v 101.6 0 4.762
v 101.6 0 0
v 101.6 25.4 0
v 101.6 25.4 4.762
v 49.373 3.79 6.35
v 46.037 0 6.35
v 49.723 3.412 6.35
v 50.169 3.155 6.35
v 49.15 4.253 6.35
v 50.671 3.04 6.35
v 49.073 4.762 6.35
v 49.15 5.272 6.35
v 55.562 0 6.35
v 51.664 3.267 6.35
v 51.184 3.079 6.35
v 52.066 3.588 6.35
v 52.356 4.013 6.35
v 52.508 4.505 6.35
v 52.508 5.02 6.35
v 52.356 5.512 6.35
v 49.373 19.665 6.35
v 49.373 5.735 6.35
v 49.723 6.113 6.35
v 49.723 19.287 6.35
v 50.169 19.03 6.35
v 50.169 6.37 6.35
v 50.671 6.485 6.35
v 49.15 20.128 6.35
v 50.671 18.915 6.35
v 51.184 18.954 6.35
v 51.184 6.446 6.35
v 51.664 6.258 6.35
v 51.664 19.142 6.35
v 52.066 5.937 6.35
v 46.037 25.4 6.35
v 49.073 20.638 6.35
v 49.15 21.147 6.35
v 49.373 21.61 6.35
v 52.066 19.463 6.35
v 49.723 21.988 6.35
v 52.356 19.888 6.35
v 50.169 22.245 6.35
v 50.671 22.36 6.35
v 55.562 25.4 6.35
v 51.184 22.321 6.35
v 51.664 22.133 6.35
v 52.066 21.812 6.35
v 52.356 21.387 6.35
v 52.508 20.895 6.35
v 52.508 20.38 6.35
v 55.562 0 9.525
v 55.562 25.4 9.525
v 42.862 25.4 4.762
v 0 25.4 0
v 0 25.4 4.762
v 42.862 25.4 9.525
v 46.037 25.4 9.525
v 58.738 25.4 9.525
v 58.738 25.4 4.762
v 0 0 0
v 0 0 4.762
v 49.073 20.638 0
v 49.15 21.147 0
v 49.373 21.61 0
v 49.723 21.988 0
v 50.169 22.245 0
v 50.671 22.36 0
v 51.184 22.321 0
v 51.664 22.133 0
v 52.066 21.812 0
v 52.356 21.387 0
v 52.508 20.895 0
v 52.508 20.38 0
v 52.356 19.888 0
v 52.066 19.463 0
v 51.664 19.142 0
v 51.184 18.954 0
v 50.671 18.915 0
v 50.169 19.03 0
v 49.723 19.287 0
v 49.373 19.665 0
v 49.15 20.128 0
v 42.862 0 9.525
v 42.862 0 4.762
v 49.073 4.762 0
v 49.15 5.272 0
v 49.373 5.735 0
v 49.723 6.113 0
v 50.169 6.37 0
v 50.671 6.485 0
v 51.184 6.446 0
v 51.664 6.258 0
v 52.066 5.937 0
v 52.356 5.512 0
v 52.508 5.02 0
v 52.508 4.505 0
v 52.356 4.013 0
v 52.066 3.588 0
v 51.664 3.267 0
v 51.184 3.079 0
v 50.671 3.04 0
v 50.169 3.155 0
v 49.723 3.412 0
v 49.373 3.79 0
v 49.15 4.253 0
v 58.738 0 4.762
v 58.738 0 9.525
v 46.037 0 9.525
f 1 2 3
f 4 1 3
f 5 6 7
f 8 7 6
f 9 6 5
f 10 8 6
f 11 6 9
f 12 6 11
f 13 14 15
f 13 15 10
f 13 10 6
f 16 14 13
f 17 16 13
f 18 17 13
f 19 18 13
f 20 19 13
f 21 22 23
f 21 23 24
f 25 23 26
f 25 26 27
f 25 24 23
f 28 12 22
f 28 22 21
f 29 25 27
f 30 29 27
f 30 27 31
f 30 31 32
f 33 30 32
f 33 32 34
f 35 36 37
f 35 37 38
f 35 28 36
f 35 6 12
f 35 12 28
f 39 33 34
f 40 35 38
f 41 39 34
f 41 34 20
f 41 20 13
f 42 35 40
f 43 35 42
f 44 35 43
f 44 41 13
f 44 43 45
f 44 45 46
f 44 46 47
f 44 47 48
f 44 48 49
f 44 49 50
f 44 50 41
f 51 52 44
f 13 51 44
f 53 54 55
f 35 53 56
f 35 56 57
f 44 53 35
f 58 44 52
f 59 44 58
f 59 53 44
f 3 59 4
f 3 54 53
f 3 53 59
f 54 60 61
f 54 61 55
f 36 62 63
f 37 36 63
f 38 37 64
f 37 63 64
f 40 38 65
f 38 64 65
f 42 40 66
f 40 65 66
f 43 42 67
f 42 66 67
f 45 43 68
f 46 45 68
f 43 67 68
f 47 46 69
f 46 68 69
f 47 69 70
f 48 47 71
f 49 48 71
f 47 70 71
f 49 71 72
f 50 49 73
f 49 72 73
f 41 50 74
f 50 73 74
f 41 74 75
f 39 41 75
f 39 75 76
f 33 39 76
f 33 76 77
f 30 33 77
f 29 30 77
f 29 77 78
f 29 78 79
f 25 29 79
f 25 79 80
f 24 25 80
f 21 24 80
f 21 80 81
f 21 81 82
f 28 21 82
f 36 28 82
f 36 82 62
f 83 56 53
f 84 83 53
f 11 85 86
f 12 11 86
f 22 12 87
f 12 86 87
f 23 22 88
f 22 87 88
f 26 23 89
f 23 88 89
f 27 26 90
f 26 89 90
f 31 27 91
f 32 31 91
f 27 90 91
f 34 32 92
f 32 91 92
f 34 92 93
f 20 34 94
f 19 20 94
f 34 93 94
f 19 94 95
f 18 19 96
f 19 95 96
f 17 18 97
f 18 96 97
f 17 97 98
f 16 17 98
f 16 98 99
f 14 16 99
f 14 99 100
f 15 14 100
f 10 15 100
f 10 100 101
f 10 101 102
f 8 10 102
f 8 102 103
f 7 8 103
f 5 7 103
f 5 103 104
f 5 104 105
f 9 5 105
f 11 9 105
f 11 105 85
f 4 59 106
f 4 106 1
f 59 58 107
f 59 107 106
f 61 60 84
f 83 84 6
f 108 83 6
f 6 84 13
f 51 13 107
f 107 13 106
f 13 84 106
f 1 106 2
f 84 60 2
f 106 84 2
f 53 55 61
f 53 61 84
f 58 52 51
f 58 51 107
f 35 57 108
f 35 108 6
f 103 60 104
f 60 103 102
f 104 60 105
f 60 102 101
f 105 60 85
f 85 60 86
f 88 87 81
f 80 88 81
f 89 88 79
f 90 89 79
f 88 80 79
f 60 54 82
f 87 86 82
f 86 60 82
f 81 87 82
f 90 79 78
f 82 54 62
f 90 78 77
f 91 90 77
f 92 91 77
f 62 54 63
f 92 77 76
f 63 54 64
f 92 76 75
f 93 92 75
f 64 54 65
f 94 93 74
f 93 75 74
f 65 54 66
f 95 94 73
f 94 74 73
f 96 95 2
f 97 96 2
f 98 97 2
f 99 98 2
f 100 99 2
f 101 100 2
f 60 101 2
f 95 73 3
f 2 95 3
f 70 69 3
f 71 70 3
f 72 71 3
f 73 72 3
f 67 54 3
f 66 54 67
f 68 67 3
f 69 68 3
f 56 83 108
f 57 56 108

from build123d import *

# Parameters (mm, degrees)
SKETCH1_W             = 101.6
SKETCH1_H             = 25.4
BOSS_EXTRUDE1_DEPTH   = 9.525
SKETCH2_W             = 9.525
SKETCH2_H             = 3.175
SKETCH2_W_2           = 42.8625
SKETCH2_H_2           = 4.7625
CUT_EXTRUDE1_DEPTH    = 106.159144277
F_8_32_TAPPED_HOLE1_D = 3.4544


with BuildPart() as part:
    # Sketch1 → Boss-Extrude1 (new body)
    with BuildSketch(Plane.XY):
        with Locations((50.8, 12.7)):
            Rectangle(SKETCH1_W, SKETCH1_H)
    extrude(amount=BOSS_EXTRUDE1_DEPTH)

    # Sketch2 → Cut-Extrude1 (cut, through all)
    with BuildSketch(Plane(origin=(0, 25.4, 0), x_dir=(1, 0, 0), z_dir=(0, 1, 0))):
        with Locations((50.8, -7.9375)):
            Rectangle(SKETCH2_W, SKETCH2_H)
        with Locations((21.43125, -7.14375)):
            Rectangle(SKETCH2_W_2, SKETCH2_H_2)
        with Locations((80.16875, -7.14375)):
            Rectangle(SKETCH2_W_2, SKETCH2_H_2)
    extrude(amount=-CUT_EXTRUDE1_DEPTH, mode=Mode.SUBTRACT)

    # #8-32 Tapped Hole1 (through all)
    with Locations(Plane.XY.offset(6.35)):
        with Locations((50.8, 4.7625), (50.8, 20.6375)):
            Hole(F_8_32_TAPPED_HOLE1_D / 2)


solid = part.part
